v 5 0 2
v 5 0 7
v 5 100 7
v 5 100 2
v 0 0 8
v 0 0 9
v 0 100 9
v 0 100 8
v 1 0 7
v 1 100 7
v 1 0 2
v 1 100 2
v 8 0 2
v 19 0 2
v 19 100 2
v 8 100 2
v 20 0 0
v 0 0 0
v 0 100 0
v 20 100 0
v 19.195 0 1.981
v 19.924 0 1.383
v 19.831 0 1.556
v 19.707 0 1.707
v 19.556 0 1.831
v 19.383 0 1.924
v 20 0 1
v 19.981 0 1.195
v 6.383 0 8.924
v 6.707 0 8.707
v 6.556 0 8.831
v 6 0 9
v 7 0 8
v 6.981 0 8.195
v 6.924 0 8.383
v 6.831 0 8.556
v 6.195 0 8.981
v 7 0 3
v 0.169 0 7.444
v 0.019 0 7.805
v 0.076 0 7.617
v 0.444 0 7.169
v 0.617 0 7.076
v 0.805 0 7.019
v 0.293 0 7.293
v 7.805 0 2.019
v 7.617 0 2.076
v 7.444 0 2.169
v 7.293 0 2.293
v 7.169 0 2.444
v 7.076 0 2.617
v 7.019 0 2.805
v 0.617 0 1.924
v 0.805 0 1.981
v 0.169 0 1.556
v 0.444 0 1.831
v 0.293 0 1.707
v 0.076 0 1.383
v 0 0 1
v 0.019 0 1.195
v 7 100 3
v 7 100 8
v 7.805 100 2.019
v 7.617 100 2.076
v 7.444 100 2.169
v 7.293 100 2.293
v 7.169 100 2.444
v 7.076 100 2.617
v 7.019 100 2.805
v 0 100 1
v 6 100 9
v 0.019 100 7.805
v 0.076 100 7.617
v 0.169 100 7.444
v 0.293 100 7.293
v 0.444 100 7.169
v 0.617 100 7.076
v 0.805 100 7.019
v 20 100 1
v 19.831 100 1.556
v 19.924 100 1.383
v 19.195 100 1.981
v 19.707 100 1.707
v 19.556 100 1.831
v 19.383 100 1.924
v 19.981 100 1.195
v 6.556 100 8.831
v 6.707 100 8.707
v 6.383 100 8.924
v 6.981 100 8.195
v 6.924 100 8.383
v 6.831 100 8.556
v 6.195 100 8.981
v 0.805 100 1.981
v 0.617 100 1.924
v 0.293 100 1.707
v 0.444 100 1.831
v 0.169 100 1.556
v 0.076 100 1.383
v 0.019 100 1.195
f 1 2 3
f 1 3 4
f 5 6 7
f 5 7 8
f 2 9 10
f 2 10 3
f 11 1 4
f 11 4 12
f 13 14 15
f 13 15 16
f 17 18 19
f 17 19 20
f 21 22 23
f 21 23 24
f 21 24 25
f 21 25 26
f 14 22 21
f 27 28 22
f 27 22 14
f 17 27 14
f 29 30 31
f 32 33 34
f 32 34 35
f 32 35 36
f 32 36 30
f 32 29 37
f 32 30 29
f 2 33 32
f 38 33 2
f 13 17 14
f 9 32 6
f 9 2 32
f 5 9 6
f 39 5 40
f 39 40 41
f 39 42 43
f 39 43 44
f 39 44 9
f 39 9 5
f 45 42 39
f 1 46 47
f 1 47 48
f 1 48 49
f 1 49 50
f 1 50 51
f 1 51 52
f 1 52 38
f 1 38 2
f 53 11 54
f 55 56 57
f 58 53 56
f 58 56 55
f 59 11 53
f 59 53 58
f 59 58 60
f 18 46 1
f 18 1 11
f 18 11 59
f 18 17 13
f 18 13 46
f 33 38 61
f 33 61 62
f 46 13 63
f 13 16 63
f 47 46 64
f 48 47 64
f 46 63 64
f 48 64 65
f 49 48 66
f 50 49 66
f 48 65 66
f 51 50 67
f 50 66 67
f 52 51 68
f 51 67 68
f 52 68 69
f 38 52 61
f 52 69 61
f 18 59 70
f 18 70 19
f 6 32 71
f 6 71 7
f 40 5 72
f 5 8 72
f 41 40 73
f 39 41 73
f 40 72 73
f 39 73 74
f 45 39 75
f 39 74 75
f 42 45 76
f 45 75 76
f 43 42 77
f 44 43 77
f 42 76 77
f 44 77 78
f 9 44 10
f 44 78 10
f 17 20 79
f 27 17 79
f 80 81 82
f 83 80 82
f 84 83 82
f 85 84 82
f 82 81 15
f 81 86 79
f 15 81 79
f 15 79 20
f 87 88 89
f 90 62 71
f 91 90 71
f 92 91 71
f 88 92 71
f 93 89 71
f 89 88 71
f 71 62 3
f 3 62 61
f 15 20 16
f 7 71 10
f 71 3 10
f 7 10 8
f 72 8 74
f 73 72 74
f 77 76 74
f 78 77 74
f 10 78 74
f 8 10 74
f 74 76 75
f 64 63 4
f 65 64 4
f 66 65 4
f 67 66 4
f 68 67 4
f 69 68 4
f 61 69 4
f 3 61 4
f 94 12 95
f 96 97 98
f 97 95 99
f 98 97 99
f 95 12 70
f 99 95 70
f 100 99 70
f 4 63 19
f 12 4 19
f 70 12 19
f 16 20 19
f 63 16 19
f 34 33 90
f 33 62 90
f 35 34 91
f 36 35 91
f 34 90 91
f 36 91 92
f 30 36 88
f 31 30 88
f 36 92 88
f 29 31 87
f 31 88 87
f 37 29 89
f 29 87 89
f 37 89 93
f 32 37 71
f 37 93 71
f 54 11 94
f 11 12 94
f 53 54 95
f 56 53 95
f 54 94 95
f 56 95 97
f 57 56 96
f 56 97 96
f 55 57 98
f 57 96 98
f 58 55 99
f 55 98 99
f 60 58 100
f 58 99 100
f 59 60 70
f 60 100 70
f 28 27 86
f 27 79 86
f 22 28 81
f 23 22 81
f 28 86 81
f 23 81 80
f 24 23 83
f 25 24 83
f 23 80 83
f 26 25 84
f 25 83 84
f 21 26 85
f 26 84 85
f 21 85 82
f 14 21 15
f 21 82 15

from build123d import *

# Parameters (mm, degrees)
BOSS_EXTRUDE1_DEPTH = 100
FILLET1_R           = 1


with BuildPart() as part:
    # Sketch1 → Boss-Extrude1 (new body)
    with BuildSketch(Plane(origin=(0, 0, 0), x_dir=(1, 0, 0), z_dir=(0, 1, 0))):
        Polygon((0, 0), (20, 0), (20, -2), (7, -2), (7, -9), (0, -9), (0, -7), (5, -7), (5, -2), (0, -2), align=None)
    extrude(amount=BOSS_EXTRUDE1_DEPTH)

    # Fillet1
    fillet1_edges = [part.edges().sort_by_distance(p)[0] for p in [
        (20, 50, 2),
        (7, 50, 2),
        (7, 50, 9),
        (0, 50, 7),
        (0, 50, 2),
    ]]
    fillet(fillet1_edges, radius=FILLET1_R)


solid = part.part
